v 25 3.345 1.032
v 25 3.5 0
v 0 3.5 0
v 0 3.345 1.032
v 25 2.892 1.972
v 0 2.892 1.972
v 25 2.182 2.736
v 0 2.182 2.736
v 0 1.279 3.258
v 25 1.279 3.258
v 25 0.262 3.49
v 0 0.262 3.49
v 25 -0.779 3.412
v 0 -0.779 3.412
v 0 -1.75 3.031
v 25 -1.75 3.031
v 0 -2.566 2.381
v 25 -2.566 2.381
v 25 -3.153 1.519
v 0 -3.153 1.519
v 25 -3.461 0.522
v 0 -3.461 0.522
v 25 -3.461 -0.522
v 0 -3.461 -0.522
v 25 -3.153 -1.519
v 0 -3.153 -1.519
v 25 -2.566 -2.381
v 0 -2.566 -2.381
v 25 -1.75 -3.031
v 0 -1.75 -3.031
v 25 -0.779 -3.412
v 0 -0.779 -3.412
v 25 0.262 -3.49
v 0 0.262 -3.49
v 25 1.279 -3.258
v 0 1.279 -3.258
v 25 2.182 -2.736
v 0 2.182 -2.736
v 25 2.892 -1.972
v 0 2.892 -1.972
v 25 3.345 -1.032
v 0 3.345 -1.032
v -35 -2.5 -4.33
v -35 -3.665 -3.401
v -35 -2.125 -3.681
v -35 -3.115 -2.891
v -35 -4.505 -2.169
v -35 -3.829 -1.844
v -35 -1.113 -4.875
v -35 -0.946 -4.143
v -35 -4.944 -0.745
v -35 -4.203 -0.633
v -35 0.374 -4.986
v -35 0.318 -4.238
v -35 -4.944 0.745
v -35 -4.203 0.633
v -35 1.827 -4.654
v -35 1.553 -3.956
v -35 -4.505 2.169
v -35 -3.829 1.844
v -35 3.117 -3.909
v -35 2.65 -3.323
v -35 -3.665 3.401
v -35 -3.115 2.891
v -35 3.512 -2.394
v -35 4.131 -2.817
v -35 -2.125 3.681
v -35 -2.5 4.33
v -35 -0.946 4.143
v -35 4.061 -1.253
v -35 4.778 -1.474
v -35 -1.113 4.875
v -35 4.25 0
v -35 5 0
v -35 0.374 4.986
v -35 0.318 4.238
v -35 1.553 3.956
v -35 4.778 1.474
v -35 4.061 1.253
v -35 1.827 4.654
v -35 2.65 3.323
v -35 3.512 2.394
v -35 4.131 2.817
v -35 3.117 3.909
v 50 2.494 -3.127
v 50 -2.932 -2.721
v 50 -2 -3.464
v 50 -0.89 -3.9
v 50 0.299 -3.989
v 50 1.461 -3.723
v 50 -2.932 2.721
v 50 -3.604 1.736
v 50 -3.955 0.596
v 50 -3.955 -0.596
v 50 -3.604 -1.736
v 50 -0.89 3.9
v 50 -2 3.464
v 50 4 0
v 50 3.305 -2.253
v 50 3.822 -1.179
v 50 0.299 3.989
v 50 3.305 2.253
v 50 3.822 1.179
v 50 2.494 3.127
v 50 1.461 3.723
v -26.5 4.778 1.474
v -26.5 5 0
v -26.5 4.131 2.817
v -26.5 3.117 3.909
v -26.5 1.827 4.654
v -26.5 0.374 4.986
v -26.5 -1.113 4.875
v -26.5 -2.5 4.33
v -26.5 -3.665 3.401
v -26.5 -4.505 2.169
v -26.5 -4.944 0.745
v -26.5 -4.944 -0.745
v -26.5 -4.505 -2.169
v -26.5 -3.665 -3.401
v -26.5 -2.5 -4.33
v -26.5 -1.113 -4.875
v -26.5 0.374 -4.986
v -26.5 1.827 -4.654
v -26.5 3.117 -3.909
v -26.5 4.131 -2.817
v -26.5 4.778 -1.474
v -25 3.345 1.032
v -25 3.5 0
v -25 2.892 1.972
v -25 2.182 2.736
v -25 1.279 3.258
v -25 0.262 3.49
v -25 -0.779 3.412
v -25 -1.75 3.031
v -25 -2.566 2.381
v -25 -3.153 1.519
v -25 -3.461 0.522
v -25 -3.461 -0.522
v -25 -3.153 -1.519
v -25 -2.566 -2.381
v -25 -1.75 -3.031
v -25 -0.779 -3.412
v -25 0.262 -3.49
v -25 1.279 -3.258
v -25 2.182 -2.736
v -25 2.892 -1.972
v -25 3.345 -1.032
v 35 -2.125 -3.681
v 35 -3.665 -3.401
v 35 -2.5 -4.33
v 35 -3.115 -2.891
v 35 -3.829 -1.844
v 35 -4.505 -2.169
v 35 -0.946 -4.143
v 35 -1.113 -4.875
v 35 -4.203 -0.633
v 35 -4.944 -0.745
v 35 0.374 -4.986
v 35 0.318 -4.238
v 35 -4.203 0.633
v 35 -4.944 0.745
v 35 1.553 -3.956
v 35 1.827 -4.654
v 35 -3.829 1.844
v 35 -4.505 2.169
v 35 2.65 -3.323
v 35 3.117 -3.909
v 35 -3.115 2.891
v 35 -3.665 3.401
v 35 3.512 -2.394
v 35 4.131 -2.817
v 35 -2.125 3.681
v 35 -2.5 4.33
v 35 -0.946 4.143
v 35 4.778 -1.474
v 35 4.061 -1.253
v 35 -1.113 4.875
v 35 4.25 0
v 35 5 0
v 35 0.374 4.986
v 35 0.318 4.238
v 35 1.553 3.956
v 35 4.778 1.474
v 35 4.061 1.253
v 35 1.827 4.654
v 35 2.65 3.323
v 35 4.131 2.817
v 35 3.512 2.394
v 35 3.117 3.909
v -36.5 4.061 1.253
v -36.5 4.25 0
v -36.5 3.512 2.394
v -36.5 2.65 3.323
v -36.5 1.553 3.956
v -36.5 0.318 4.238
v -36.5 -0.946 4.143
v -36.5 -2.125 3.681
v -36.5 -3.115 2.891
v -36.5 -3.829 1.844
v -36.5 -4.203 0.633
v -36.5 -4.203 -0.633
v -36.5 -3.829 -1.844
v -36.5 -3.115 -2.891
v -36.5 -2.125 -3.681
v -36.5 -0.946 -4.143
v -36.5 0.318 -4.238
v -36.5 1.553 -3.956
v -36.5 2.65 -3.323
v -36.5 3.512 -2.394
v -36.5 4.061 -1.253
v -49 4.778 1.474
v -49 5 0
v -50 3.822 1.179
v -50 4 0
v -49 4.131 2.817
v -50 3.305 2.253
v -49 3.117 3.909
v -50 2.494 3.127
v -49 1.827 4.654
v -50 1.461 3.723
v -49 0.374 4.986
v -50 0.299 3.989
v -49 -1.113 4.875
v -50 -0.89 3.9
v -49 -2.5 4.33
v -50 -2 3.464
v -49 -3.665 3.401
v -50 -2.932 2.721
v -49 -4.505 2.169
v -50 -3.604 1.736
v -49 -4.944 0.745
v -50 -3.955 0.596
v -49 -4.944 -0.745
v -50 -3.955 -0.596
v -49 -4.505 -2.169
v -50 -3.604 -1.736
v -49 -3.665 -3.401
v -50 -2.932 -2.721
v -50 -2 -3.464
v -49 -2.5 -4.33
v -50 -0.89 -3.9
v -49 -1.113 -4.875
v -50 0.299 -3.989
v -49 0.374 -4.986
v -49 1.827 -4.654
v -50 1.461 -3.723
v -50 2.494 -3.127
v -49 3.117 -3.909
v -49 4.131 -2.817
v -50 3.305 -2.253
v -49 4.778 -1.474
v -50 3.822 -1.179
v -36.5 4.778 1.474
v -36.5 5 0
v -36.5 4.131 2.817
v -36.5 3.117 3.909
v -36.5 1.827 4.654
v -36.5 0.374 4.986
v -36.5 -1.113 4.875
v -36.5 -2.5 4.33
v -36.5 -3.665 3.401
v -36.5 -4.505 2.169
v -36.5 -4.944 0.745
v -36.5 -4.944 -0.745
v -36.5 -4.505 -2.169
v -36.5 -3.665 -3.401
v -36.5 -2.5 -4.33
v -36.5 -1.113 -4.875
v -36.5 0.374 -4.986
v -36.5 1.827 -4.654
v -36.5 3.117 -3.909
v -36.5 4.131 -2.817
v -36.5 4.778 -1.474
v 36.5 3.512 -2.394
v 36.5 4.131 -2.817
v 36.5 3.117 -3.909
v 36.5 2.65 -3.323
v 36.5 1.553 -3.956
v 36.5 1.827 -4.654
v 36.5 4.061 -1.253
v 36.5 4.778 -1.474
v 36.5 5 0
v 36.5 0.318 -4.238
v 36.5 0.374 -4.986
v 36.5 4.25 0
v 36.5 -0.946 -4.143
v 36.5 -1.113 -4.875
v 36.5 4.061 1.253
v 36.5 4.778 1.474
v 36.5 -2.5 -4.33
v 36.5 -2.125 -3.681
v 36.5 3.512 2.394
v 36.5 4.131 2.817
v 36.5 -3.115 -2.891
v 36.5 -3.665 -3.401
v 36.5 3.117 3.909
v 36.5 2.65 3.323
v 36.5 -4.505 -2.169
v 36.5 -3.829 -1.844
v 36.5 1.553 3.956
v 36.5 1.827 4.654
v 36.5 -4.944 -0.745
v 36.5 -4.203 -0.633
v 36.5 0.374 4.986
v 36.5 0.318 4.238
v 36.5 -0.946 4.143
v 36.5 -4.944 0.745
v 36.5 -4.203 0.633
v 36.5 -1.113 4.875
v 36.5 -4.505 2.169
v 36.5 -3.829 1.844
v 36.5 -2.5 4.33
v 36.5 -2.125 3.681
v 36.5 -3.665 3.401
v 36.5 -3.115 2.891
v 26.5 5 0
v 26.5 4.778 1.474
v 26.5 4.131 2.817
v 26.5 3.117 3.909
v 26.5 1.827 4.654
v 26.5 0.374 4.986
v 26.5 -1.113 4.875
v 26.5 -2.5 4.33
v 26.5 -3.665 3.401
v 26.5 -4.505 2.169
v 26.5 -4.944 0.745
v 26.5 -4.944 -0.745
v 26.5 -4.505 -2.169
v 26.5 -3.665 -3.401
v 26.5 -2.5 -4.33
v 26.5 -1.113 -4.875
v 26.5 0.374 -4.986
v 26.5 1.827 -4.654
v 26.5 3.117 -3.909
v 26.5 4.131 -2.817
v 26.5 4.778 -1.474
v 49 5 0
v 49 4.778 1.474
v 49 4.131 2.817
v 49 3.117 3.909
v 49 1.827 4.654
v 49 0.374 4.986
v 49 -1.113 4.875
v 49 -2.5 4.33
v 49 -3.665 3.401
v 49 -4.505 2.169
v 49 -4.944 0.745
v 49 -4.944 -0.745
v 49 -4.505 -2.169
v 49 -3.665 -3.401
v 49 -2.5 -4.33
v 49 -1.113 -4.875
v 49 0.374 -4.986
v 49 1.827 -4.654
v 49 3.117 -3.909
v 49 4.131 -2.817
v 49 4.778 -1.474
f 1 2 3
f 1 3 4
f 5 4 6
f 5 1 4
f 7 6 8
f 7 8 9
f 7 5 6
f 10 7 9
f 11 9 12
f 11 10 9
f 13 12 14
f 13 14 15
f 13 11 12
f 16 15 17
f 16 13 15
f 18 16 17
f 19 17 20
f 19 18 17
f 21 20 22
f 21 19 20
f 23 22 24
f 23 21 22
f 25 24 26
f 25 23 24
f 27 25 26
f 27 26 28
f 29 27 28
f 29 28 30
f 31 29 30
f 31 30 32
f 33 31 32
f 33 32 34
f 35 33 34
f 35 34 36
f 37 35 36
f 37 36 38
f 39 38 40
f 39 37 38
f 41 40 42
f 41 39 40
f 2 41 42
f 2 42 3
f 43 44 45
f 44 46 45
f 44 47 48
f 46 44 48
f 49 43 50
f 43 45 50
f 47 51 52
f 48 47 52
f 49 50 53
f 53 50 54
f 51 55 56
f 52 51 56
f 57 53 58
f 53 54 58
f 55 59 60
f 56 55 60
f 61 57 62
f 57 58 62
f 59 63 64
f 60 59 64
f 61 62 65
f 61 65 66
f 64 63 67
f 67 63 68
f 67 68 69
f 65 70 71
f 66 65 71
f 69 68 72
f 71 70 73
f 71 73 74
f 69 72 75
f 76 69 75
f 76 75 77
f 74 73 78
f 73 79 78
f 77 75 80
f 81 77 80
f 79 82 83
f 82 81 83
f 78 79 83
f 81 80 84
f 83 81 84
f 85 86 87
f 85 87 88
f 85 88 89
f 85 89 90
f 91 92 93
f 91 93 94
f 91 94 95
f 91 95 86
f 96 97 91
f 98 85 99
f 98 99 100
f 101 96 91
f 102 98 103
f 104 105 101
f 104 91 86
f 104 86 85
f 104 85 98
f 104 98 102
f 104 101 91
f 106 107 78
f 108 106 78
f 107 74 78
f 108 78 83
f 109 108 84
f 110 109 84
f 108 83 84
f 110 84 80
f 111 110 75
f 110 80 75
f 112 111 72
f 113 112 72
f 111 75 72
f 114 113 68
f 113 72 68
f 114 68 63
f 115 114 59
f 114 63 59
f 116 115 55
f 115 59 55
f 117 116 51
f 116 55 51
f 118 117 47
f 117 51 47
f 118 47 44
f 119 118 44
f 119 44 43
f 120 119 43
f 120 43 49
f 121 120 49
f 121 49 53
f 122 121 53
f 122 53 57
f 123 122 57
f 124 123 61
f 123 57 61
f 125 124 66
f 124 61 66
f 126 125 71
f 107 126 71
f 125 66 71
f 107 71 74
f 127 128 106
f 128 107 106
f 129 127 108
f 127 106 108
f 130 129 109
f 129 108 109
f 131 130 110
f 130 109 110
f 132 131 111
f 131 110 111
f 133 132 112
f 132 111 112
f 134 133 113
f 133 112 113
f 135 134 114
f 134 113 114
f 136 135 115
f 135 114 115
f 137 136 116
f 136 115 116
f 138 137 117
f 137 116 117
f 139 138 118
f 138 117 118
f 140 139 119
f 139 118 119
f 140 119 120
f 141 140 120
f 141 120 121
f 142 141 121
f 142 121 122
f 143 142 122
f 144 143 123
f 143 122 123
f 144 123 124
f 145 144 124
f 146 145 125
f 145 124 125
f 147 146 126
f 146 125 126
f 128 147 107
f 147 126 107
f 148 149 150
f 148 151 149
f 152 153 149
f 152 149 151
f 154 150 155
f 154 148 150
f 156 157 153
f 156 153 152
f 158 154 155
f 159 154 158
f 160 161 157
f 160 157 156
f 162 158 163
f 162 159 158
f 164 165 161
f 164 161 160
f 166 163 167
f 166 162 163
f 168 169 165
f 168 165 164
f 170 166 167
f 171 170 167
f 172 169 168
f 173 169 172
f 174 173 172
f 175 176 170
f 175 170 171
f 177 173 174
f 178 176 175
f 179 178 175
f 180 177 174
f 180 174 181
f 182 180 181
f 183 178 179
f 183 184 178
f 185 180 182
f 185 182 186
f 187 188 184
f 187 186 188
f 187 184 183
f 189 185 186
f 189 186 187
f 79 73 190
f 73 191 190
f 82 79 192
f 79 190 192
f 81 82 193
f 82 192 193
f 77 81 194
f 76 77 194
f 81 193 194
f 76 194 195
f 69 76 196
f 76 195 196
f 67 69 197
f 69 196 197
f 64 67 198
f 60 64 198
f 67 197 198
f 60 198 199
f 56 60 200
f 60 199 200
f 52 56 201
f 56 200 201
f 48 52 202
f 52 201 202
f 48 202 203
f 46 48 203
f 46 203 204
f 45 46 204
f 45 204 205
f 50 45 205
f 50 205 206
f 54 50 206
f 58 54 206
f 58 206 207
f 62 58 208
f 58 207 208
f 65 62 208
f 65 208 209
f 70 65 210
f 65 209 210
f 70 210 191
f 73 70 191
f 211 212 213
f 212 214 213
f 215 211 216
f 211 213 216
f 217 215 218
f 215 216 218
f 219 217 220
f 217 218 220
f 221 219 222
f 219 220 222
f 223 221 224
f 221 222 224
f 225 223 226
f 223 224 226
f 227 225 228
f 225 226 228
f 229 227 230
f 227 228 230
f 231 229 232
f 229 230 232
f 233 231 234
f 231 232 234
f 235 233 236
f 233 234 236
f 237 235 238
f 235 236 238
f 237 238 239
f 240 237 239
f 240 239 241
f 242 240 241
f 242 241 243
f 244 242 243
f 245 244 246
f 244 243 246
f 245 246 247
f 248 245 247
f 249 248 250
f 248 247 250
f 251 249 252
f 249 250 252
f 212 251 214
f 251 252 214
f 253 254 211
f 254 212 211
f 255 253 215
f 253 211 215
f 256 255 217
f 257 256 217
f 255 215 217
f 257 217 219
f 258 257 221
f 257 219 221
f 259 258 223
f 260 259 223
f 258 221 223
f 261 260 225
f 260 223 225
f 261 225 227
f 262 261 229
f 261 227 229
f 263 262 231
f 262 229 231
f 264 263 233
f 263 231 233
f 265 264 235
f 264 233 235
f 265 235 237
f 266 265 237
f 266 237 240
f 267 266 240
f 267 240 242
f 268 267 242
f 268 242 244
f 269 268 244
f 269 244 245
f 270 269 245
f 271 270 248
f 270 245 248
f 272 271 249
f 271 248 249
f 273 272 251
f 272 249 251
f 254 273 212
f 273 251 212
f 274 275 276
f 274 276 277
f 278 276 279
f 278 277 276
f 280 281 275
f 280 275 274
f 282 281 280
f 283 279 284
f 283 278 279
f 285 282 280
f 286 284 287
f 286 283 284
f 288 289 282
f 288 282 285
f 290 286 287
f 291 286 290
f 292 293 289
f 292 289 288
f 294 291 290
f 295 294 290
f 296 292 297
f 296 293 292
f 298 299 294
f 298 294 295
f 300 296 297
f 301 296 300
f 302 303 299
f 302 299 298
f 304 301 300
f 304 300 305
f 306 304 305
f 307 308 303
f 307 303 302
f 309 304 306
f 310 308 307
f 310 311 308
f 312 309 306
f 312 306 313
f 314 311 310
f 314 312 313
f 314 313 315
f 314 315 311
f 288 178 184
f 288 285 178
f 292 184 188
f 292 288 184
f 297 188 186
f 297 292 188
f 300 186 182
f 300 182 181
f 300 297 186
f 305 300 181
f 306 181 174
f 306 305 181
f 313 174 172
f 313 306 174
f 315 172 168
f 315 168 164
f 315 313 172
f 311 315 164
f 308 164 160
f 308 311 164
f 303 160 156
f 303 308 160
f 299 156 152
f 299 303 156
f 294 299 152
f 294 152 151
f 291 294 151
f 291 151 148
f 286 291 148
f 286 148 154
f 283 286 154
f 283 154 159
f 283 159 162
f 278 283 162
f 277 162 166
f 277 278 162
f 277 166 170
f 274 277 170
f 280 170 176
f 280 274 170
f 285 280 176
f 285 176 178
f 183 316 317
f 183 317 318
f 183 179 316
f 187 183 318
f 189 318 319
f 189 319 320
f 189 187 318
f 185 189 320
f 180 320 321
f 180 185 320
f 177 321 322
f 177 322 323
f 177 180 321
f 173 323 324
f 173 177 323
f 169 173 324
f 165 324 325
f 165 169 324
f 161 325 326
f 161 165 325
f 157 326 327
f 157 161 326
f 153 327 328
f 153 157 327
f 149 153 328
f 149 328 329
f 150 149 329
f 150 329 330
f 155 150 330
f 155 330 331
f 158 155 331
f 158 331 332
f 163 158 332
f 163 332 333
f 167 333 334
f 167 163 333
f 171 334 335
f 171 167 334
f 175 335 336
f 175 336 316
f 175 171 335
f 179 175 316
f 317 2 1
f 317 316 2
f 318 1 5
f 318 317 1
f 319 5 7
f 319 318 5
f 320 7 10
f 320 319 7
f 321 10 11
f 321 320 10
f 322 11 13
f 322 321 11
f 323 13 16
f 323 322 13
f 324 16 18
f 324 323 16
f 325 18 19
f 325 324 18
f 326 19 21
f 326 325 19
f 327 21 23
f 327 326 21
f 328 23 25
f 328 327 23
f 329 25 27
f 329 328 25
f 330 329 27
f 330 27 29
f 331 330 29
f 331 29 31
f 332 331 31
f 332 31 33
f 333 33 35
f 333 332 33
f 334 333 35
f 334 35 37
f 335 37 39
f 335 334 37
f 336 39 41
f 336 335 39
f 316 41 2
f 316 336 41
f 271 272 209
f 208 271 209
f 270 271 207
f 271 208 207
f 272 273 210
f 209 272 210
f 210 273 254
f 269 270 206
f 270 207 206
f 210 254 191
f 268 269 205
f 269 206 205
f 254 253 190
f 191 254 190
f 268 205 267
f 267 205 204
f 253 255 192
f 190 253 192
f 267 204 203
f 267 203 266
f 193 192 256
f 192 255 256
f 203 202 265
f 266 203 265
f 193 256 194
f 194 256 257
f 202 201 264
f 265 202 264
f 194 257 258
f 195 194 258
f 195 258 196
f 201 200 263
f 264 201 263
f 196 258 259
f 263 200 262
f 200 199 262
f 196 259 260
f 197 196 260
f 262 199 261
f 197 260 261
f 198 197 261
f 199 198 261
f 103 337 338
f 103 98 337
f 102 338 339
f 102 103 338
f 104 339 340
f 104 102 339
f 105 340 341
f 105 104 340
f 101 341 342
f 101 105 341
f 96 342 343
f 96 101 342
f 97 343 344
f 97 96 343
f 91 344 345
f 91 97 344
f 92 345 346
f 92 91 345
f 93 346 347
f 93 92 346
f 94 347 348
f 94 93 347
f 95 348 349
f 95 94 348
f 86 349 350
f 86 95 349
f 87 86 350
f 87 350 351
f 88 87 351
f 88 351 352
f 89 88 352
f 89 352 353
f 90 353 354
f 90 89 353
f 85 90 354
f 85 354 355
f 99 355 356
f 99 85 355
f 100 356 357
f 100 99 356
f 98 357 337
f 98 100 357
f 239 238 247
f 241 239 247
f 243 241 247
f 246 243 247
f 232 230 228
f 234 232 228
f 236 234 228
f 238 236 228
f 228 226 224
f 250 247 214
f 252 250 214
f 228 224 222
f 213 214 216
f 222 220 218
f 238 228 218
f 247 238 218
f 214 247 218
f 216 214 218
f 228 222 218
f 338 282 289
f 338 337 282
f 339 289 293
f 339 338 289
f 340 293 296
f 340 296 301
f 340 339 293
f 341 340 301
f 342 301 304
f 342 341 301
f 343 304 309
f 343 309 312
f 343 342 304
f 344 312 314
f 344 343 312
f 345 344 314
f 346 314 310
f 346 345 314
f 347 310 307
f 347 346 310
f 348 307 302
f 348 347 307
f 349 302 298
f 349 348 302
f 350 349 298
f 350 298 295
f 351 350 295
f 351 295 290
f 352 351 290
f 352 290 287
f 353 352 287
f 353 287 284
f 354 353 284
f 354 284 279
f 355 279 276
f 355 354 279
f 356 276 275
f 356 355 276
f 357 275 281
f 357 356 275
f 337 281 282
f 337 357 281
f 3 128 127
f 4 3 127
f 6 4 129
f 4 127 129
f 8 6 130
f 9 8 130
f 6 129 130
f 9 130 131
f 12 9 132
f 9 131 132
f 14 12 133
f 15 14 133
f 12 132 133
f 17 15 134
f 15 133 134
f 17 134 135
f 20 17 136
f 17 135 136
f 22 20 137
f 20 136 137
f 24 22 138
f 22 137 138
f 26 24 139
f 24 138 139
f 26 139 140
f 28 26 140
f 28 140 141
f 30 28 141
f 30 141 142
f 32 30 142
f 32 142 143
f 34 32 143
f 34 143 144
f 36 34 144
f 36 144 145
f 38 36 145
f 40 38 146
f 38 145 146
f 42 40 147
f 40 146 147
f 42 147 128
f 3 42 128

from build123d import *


with BuildPart() as part:
    # Esquisse1 → Révolution1 (revolve)
    with BuildSketch(Plane.XY):
        Polygon((0, 0), (0, 3.5), (-25, 3.5), (-26.5, 5), (-35, 5), (-35, 4.25), (-36.5, 4.25), (-36.5, 5), (-49, 5), (-50, 4), (-50, 0), align=None)
    r_volution1 = revolve(axis=Axis((-50, 0, 0), (1, 0, 0)))

    # Symétrie1: Révolution1 across Right Plane
    add(r_volution1.mirror(Plane(origin=(0, 0, 0), x_dir=(0, 0, -1), z_dir=(1, 0, 0))))


solid = part.part
